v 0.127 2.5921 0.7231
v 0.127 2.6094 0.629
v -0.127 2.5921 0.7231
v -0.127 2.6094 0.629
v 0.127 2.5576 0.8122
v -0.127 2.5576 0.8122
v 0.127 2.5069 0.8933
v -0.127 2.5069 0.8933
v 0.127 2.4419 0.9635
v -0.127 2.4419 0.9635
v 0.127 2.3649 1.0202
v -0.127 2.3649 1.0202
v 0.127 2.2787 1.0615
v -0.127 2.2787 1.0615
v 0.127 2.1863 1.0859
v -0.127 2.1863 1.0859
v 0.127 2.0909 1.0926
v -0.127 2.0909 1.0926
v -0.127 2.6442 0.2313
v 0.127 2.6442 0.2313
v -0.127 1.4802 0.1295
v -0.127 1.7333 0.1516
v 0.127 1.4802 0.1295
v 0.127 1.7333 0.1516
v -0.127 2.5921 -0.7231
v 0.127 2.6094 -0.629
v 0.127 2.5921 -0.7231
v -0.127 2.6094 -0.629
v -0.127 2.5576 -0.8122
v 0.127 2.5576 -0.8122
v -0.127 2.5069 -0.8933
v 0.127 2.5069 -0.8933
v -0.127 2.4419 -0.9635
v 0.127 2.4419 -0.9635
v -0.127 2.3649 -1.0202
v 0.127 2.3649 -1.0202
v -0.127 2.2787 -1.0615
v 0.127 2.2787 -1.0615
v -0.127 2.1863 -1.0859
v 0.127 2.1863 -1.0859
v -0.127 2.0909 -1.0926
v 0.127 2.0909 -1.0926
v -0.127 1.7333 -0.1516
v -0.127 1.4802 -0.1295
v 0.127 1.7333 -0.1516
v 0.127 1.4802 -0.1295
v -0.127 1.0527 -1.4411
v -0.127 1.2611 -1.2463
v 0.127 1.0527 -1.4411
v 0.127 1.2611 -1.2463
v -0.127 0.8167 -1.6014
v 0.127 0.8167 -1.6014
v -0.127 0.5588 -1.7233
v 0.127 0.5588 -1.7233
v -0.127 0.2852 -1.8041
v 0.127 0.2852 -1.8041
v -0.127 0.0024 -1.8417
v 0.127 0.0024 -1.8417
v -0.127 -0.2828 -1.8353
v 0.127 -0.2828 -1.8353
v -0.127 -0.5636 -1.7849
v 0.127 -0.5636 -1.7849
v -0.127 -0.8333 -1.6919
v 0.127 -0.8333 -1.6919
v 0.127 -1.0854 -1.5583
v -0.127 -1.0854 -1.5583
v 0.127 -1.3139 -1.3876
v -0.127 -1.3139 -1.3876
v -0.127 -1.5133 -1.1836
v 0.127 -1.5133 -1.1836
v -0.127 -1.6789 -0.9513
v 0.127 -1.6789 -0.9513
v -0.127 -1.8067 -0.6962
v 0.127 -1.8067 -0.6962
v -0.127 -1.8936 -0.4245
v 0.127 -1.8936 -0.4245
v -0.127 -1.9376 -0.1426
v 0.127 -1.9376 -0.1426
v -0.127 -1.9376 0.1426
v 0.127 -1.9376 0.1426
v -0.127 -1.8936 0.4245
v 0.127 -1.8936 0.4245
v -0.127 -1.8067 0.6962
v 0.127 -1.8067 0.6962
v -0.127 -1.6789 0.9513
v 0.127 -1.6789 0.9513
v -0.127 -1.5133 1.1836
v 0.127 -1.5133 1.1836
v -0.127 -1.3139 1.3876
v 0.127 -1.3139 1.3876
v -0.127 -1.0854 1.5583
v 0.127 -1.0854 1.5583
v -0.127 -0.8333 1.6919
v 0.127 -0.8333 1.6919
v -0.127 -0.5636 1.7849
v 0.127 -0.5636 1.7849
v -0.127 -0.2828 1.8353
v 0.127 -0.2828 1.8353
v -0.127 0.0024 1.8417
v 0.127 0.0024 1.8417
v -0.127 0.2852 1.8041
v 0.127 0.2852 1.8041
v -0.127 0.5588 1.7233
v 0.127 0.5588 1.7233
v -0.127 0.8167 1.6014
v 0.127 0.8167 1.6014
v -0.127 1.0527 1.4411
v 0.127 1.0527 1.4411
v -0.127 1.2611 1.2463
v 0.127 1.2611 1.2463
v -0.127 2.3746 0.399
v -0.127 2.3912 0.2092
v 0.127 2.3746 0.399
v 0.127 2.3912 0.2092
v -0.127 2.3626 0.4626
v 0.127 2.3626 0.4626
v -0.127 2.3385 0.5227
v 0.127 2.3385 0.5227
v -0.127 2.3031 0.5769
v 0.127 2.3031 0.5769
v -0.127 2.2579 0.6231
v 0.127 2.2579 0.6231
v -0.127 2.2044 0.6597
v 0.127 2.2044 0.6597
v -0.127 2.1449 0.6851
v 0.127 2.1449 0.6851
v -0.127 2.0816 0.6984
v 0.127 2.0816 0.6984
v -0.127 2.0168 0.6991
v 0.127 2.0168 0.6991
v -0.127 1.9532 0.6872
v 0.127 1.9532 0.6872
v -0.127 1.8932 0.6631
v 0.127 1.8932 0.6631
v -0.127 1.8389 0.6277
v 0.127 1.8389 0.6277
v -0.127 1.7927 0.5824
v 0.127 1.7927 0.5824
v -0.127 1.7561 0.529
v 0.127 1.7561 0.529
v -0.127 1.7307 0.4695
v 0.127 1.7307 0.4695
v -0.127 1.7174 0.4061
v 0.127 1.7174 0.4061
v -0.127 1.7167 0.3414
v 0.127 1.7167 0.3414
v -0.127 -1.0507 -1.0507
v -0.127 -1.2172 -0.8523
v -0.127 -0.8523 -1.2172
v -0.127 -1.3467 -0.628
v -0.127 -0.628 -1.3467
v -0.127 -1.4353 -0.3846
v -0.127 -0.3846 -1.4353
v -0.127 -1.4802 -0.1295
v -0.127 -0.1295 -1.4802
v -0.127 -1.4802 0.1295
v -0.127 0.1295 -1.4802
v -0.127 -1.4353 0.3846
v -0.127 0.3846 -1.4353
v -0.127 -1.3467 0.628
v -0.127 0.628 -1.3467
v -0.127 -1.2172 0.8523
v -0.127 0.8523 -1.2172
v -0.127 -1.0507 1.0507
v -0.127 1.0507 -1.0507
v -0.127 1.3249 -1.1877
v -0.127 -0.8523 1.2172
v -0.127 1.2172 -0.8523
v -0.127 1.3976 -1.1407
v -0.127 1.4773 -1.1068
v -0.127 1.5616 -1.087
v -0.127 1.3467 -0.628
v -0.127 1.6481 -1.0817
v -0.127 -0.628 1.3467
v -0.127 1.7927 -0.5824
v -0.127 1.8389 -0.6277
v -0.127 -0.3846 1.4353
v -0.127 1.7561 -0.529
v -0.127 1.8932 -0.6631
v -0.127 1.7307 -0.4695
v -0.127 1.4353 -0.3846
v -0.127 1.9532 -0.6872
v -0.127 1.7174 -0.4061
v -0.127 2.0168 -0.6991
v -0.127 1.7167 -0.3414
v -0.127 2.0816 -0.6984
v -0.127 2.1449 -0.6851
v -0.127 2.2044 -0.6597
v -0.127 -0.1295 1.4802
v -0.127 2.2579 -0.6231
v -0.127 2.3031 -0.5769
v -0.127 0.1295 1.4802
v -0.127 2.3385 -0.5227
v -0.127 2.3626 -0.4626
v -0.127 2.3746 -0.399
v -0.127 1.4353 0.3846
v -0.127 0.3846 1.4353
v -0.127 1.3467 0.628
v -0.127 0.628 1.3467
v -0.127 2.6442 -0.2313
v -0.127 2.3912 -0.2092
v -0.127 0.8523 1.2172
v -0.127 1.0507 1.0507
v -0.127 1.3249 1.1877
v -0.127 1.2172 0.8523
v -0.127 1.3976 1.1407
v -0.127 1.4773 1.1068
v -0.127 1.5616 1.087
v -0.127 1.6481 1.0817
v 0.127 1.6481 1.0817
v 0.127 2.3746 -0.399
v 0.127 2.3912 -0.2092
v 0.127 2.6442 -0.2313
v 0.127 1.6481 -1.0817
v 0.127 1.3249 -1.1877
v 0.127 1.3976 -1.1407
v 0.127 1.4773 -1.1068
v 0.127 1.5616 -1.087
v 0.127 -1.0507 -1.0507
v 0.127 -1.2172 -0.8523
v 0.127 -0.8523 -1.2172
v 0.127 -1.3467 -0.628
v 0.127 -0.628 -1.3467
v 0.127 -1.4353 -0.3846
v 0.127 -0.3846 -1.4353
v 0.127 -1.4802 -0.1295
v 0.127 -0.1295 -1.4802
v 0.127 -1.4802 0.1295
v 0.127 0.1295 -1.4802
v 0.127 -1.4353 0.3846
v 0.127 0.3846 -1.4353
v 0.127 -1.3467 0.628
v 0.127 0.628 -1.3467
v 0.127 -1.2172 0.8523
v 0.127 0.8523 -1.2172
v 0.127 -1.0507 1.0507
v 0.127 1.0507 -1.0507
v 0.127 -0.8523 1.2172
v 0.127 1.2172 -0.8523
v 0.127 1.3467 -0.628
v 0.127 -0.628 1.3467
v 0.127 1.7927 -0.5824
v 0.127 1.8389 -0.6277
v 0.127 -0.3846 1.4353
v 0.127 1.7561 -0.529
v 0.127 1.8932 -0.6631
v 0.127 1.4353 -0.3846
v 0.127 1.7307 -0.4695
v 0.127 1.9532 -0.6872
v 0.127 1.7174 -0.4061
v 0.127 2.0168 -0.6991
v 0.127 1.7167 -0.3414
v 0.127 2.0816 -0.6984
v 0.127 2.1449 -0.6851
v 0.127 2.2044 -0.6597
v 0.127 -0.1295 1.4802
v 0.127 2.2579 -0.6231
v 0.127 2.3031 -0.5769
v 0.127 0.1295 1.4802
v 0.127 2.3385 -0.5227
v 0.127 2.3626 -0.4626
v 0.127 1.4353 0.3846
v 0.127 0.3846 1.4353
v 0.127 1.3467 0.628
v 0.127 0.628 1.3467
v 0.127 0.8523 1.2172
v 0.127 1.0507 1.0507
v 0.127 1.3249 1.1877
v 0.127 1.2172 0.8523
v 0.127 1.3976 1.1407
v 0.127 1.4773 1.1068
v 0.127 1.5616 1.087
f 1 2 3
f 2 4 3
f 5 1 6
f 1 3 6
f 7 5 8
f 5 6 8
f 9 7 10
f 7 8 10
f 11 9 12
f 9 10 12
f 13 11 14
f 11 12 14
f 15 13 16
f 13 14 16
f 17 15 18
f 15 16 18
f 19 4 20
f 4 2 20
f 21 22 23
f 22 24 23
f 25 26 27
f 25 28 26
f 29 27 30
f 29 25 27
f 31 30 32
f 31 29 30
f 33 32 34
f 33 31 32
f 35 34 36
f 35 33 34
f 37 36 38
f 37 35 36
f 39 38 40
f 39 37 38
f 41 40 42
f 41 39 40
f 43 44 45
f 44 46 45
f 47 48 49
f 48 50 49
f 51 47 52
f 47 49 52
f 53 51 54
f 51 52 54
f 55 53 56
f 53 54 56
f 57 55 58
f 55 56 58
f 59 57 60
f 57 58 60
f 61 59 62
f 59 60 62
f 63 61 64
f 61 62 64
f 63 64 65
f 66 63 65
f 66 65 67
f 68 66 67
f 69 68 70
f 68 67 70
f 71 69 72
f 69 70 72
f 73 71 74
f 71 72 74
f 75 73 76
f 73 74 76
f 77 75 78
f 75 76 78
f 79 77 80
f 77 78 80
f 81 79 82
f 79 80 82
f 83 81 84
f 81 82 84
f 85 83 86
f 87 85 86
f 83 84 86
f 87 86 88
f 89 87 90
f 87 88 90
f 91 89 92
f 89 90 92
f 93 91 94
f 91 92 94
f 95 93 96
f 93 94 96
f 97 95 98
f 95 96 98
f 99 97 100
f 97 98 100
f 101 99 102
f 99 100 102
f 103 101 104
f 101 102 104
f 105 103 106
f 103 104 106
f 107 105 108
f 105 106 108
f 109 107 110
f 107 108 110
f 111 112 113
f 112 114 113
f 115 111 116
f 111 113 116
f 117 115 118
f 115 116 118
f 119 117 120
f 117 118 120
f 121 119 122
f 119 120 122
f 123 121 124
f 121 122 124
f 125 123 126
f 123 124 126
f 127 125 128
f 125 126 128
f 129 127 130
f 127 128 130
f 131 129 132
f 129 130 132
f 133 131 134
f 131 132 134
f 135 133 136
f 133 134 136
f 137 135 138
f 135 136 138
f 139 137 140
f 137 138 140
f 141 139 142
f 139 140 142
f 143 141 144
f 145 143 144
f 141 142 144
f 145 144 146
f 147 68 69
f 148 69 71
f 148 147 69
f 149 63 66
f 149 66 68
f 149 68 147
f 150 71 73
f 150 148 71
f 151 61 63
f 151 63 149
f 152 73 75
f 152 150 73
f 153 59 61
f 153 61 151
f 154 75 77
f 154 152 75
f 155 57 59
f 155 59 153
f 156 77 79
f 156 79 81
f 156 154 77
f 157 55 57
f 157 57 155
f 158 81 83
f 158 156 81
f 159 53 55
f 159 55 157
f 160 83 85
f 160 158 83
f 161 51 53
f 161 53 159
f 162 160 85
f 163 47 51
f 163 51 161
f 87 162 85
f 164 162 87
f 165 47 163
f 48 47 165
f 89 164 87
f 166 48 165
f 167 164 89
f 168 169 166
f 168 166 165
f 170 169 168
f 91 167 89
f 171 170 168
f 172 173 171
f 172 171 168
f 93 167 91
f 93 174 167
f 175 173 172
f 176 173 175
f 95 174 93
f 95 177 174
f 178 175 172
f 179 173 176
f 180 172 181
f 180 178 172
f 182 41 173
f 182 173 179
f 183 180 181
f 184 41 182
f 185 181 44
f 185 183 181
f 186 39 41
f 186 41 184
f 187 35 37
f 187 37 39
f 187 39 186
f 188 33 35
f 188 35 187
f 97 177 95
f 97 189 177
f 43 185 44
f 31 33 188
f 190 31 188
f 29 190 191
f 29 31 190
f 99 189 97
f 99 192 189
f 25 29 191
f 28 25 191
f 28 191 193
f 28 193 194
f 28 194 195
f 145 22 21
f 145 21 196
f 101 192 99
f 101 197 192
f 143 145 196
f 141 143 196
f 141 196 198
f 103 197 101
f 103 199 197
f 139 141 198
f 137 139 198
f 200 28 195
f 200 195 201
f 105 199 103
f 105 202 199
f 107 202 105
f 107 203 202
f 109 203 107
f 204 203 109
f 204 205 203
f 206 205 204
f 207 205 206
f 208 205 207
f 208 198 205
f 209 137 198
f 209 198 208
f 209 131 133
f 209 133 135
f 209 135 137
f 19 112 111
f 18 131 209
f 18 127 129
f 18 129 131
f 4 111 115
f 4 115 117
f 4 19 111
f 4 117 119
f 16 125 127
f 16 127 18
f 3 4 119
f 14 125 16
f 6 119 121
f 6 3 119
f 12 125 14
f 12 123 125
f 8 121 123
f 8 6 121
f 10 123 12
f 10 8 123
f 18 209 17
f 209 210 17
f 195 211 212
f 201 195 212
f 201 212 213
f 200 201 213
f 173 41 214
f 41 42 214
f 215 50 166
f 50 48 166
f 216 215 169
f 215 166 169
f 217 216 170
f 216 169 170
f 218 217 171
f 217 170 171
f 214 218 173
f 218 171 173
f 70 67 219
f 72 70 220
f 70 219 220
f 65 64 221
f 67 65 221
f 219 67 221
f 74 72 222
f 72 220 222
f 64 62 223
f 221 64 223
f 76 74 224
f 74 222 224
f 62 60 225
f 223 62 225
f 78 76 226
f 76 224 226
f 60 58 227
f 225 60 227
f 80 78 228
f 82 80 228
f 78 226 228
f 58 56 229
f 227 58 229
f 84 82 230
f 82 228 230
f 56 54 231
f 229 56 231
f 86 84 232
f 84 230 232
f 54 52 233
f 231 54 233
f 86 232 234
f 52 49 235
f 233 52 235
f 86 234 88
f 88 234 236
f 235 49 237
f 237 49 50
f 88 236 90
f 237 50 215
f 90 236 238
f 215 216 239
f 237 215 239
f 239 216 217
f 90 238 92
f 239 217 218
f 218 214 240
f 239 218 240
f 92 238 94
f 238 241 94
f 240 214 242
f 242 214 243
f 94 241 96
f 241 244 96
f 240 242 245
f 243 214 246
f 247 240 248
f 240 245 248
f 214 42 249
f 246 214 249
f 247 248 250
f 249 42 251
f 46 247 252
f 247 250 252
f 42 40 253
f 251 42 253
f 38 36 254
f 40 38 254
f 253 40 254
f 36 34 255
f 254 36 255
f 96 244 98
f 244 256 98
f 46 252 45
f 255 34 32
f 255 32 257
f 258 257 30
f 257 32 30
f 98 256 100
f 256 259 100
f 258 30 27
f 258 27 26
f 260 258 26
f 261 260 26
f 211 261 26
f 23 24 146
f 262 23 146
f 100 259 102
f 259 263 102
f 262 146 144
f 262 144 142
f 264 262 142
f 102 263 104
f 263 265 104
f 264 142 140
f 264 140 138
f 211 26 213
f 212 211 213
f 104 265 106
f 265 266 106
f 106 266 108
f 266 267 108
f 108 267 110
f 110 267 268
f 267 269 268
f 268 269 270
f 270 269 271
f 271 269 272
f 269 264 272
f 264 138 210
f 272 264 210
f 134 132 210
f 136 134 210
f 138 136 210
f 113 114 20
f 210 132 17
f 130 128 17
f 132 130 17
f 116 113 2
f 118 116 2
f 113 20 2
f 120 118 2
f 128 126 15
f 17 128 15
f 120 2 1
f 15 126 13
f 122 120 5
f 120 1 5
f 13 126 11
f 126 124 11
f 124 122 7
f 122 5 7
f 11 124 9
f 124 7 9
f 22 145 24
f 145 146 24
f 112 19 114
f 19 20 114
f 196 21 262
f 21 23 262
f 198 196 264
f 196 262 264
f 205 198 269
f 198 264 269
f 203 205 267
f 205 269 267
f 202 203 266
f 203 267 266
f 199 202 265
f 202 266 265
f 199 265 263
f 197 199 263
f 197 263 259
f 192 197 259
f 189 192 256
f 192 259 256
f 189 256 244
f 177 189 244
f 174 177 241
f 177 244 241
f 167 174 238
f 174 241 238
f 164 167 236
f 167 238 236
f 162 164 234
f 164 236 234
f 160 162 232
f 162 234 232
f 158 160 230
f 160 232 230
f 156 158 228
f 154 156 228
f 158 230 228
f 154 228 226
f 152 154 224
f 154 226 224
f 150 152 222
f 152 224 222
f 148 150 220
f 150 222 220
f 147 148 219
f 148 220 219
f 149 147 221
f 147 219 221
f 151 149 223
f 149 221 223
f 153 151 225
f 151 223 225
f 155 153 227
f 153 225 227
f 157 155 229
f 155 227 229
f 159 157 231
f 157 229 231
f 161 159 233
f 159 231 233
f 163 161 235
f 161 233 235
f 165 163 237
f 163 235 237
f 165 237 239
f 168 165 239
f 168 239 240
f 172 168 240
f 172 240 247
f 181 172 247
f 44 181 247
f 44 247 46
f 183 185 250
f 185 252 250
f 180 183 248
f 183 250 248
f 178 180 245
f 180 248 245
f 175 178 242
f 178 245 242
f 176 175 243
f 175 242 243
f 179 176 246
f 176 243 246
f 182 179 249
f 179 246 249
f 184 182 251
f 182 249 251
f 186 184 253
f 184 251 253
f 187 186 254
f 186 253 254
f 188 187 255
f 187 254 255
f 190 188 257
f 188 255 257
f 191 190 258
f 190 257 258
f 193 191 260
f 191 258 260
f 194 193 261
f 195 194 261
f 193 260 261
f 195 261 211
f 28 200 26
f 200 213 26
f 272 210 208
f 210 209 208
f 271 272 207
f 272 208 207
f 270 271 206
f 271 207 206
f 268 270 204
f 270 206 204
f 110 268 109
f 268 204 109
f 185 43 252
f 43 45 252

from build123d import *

# Parameters (mm, degrees)
EXTRUDE1_DEPTH = 0.127
FILLET1_R      = 0.508


with BuildPart() as part:
    # Sketch1 → Extrude1 (new body, symmetric)
    with BuildSketch(Plane(origin=(0, 0, 0), x_dir=(0, 0, -1), z_dir=(1, 0, 0))):
        with BuildLine():
            Line((0.231337488, 2.644199587), (1.104302902, 2.56782501))
            Line((1.104302902, 2.56782501), (1.075595843, 1.399777723))
            ThreePointArc((1.075595843, 1.399777723), (0, -1.9431), (-1.075595843, 1.399777723))
            Line((-1.075595843, 1.399777723), (-1.104302902, 2.56782501))
            Line((-1.104302902, 2.56782501), (-0.231337488, 2.644199587))
            Line((-0.231337488, 2.644199587), (-0.209199929, 2.391166134))
            Line((-0.209199929, 2.391166134), (-0.398975019, 2.374562965))
            ThreePointArc((-0.398975019, 2.374562965), (-0.699139682, 2.016840649), (-0.341417367, 1.716675986))
            Line((-0.341417367, 1.716675986), (-0.151642277, 1.733279155))
            Line((-0.151642277, 1.733279155), (-0.129504718, 1.480245702))
            ThreePointArc((-0.129504718, 1.480245702), (0, -1.4859), (0.129504718, 1.480245702))
            Line((0.129504718, 1.480245702), (0.151642277, 1.733279155))
            Line((0.151642277, 1.733279155), (0.341417367, 1.716675986))
            ThreePointArc((0.341417367, 1.716675986), (0.699139682, 2.016840649), (0.398975019, 2.374562965))
            Line((0.398975019, 2.374562965), (0.209199929, 2.391166134))
            Line((0.209199929, 2.391166134), (0.231337488, 2.644199587))
        make_face()
    extrude(amount=EXTRUDE1_DEPTH, both=True)

    # Fillet1
    fillet1_edges = [part.edges().sort_by_distance(p)[0] for p in [
        (0, 2.56782501, -1.104302902),
        (0, 1.399777723, -1.075595843),
        (0, 1.399777723, 1.075595843),
        (0, 2.56782501, 1.104302902),
    ]]
    fillet(fillet1_edges, radius=FILLET1_R)


solid = part.part
